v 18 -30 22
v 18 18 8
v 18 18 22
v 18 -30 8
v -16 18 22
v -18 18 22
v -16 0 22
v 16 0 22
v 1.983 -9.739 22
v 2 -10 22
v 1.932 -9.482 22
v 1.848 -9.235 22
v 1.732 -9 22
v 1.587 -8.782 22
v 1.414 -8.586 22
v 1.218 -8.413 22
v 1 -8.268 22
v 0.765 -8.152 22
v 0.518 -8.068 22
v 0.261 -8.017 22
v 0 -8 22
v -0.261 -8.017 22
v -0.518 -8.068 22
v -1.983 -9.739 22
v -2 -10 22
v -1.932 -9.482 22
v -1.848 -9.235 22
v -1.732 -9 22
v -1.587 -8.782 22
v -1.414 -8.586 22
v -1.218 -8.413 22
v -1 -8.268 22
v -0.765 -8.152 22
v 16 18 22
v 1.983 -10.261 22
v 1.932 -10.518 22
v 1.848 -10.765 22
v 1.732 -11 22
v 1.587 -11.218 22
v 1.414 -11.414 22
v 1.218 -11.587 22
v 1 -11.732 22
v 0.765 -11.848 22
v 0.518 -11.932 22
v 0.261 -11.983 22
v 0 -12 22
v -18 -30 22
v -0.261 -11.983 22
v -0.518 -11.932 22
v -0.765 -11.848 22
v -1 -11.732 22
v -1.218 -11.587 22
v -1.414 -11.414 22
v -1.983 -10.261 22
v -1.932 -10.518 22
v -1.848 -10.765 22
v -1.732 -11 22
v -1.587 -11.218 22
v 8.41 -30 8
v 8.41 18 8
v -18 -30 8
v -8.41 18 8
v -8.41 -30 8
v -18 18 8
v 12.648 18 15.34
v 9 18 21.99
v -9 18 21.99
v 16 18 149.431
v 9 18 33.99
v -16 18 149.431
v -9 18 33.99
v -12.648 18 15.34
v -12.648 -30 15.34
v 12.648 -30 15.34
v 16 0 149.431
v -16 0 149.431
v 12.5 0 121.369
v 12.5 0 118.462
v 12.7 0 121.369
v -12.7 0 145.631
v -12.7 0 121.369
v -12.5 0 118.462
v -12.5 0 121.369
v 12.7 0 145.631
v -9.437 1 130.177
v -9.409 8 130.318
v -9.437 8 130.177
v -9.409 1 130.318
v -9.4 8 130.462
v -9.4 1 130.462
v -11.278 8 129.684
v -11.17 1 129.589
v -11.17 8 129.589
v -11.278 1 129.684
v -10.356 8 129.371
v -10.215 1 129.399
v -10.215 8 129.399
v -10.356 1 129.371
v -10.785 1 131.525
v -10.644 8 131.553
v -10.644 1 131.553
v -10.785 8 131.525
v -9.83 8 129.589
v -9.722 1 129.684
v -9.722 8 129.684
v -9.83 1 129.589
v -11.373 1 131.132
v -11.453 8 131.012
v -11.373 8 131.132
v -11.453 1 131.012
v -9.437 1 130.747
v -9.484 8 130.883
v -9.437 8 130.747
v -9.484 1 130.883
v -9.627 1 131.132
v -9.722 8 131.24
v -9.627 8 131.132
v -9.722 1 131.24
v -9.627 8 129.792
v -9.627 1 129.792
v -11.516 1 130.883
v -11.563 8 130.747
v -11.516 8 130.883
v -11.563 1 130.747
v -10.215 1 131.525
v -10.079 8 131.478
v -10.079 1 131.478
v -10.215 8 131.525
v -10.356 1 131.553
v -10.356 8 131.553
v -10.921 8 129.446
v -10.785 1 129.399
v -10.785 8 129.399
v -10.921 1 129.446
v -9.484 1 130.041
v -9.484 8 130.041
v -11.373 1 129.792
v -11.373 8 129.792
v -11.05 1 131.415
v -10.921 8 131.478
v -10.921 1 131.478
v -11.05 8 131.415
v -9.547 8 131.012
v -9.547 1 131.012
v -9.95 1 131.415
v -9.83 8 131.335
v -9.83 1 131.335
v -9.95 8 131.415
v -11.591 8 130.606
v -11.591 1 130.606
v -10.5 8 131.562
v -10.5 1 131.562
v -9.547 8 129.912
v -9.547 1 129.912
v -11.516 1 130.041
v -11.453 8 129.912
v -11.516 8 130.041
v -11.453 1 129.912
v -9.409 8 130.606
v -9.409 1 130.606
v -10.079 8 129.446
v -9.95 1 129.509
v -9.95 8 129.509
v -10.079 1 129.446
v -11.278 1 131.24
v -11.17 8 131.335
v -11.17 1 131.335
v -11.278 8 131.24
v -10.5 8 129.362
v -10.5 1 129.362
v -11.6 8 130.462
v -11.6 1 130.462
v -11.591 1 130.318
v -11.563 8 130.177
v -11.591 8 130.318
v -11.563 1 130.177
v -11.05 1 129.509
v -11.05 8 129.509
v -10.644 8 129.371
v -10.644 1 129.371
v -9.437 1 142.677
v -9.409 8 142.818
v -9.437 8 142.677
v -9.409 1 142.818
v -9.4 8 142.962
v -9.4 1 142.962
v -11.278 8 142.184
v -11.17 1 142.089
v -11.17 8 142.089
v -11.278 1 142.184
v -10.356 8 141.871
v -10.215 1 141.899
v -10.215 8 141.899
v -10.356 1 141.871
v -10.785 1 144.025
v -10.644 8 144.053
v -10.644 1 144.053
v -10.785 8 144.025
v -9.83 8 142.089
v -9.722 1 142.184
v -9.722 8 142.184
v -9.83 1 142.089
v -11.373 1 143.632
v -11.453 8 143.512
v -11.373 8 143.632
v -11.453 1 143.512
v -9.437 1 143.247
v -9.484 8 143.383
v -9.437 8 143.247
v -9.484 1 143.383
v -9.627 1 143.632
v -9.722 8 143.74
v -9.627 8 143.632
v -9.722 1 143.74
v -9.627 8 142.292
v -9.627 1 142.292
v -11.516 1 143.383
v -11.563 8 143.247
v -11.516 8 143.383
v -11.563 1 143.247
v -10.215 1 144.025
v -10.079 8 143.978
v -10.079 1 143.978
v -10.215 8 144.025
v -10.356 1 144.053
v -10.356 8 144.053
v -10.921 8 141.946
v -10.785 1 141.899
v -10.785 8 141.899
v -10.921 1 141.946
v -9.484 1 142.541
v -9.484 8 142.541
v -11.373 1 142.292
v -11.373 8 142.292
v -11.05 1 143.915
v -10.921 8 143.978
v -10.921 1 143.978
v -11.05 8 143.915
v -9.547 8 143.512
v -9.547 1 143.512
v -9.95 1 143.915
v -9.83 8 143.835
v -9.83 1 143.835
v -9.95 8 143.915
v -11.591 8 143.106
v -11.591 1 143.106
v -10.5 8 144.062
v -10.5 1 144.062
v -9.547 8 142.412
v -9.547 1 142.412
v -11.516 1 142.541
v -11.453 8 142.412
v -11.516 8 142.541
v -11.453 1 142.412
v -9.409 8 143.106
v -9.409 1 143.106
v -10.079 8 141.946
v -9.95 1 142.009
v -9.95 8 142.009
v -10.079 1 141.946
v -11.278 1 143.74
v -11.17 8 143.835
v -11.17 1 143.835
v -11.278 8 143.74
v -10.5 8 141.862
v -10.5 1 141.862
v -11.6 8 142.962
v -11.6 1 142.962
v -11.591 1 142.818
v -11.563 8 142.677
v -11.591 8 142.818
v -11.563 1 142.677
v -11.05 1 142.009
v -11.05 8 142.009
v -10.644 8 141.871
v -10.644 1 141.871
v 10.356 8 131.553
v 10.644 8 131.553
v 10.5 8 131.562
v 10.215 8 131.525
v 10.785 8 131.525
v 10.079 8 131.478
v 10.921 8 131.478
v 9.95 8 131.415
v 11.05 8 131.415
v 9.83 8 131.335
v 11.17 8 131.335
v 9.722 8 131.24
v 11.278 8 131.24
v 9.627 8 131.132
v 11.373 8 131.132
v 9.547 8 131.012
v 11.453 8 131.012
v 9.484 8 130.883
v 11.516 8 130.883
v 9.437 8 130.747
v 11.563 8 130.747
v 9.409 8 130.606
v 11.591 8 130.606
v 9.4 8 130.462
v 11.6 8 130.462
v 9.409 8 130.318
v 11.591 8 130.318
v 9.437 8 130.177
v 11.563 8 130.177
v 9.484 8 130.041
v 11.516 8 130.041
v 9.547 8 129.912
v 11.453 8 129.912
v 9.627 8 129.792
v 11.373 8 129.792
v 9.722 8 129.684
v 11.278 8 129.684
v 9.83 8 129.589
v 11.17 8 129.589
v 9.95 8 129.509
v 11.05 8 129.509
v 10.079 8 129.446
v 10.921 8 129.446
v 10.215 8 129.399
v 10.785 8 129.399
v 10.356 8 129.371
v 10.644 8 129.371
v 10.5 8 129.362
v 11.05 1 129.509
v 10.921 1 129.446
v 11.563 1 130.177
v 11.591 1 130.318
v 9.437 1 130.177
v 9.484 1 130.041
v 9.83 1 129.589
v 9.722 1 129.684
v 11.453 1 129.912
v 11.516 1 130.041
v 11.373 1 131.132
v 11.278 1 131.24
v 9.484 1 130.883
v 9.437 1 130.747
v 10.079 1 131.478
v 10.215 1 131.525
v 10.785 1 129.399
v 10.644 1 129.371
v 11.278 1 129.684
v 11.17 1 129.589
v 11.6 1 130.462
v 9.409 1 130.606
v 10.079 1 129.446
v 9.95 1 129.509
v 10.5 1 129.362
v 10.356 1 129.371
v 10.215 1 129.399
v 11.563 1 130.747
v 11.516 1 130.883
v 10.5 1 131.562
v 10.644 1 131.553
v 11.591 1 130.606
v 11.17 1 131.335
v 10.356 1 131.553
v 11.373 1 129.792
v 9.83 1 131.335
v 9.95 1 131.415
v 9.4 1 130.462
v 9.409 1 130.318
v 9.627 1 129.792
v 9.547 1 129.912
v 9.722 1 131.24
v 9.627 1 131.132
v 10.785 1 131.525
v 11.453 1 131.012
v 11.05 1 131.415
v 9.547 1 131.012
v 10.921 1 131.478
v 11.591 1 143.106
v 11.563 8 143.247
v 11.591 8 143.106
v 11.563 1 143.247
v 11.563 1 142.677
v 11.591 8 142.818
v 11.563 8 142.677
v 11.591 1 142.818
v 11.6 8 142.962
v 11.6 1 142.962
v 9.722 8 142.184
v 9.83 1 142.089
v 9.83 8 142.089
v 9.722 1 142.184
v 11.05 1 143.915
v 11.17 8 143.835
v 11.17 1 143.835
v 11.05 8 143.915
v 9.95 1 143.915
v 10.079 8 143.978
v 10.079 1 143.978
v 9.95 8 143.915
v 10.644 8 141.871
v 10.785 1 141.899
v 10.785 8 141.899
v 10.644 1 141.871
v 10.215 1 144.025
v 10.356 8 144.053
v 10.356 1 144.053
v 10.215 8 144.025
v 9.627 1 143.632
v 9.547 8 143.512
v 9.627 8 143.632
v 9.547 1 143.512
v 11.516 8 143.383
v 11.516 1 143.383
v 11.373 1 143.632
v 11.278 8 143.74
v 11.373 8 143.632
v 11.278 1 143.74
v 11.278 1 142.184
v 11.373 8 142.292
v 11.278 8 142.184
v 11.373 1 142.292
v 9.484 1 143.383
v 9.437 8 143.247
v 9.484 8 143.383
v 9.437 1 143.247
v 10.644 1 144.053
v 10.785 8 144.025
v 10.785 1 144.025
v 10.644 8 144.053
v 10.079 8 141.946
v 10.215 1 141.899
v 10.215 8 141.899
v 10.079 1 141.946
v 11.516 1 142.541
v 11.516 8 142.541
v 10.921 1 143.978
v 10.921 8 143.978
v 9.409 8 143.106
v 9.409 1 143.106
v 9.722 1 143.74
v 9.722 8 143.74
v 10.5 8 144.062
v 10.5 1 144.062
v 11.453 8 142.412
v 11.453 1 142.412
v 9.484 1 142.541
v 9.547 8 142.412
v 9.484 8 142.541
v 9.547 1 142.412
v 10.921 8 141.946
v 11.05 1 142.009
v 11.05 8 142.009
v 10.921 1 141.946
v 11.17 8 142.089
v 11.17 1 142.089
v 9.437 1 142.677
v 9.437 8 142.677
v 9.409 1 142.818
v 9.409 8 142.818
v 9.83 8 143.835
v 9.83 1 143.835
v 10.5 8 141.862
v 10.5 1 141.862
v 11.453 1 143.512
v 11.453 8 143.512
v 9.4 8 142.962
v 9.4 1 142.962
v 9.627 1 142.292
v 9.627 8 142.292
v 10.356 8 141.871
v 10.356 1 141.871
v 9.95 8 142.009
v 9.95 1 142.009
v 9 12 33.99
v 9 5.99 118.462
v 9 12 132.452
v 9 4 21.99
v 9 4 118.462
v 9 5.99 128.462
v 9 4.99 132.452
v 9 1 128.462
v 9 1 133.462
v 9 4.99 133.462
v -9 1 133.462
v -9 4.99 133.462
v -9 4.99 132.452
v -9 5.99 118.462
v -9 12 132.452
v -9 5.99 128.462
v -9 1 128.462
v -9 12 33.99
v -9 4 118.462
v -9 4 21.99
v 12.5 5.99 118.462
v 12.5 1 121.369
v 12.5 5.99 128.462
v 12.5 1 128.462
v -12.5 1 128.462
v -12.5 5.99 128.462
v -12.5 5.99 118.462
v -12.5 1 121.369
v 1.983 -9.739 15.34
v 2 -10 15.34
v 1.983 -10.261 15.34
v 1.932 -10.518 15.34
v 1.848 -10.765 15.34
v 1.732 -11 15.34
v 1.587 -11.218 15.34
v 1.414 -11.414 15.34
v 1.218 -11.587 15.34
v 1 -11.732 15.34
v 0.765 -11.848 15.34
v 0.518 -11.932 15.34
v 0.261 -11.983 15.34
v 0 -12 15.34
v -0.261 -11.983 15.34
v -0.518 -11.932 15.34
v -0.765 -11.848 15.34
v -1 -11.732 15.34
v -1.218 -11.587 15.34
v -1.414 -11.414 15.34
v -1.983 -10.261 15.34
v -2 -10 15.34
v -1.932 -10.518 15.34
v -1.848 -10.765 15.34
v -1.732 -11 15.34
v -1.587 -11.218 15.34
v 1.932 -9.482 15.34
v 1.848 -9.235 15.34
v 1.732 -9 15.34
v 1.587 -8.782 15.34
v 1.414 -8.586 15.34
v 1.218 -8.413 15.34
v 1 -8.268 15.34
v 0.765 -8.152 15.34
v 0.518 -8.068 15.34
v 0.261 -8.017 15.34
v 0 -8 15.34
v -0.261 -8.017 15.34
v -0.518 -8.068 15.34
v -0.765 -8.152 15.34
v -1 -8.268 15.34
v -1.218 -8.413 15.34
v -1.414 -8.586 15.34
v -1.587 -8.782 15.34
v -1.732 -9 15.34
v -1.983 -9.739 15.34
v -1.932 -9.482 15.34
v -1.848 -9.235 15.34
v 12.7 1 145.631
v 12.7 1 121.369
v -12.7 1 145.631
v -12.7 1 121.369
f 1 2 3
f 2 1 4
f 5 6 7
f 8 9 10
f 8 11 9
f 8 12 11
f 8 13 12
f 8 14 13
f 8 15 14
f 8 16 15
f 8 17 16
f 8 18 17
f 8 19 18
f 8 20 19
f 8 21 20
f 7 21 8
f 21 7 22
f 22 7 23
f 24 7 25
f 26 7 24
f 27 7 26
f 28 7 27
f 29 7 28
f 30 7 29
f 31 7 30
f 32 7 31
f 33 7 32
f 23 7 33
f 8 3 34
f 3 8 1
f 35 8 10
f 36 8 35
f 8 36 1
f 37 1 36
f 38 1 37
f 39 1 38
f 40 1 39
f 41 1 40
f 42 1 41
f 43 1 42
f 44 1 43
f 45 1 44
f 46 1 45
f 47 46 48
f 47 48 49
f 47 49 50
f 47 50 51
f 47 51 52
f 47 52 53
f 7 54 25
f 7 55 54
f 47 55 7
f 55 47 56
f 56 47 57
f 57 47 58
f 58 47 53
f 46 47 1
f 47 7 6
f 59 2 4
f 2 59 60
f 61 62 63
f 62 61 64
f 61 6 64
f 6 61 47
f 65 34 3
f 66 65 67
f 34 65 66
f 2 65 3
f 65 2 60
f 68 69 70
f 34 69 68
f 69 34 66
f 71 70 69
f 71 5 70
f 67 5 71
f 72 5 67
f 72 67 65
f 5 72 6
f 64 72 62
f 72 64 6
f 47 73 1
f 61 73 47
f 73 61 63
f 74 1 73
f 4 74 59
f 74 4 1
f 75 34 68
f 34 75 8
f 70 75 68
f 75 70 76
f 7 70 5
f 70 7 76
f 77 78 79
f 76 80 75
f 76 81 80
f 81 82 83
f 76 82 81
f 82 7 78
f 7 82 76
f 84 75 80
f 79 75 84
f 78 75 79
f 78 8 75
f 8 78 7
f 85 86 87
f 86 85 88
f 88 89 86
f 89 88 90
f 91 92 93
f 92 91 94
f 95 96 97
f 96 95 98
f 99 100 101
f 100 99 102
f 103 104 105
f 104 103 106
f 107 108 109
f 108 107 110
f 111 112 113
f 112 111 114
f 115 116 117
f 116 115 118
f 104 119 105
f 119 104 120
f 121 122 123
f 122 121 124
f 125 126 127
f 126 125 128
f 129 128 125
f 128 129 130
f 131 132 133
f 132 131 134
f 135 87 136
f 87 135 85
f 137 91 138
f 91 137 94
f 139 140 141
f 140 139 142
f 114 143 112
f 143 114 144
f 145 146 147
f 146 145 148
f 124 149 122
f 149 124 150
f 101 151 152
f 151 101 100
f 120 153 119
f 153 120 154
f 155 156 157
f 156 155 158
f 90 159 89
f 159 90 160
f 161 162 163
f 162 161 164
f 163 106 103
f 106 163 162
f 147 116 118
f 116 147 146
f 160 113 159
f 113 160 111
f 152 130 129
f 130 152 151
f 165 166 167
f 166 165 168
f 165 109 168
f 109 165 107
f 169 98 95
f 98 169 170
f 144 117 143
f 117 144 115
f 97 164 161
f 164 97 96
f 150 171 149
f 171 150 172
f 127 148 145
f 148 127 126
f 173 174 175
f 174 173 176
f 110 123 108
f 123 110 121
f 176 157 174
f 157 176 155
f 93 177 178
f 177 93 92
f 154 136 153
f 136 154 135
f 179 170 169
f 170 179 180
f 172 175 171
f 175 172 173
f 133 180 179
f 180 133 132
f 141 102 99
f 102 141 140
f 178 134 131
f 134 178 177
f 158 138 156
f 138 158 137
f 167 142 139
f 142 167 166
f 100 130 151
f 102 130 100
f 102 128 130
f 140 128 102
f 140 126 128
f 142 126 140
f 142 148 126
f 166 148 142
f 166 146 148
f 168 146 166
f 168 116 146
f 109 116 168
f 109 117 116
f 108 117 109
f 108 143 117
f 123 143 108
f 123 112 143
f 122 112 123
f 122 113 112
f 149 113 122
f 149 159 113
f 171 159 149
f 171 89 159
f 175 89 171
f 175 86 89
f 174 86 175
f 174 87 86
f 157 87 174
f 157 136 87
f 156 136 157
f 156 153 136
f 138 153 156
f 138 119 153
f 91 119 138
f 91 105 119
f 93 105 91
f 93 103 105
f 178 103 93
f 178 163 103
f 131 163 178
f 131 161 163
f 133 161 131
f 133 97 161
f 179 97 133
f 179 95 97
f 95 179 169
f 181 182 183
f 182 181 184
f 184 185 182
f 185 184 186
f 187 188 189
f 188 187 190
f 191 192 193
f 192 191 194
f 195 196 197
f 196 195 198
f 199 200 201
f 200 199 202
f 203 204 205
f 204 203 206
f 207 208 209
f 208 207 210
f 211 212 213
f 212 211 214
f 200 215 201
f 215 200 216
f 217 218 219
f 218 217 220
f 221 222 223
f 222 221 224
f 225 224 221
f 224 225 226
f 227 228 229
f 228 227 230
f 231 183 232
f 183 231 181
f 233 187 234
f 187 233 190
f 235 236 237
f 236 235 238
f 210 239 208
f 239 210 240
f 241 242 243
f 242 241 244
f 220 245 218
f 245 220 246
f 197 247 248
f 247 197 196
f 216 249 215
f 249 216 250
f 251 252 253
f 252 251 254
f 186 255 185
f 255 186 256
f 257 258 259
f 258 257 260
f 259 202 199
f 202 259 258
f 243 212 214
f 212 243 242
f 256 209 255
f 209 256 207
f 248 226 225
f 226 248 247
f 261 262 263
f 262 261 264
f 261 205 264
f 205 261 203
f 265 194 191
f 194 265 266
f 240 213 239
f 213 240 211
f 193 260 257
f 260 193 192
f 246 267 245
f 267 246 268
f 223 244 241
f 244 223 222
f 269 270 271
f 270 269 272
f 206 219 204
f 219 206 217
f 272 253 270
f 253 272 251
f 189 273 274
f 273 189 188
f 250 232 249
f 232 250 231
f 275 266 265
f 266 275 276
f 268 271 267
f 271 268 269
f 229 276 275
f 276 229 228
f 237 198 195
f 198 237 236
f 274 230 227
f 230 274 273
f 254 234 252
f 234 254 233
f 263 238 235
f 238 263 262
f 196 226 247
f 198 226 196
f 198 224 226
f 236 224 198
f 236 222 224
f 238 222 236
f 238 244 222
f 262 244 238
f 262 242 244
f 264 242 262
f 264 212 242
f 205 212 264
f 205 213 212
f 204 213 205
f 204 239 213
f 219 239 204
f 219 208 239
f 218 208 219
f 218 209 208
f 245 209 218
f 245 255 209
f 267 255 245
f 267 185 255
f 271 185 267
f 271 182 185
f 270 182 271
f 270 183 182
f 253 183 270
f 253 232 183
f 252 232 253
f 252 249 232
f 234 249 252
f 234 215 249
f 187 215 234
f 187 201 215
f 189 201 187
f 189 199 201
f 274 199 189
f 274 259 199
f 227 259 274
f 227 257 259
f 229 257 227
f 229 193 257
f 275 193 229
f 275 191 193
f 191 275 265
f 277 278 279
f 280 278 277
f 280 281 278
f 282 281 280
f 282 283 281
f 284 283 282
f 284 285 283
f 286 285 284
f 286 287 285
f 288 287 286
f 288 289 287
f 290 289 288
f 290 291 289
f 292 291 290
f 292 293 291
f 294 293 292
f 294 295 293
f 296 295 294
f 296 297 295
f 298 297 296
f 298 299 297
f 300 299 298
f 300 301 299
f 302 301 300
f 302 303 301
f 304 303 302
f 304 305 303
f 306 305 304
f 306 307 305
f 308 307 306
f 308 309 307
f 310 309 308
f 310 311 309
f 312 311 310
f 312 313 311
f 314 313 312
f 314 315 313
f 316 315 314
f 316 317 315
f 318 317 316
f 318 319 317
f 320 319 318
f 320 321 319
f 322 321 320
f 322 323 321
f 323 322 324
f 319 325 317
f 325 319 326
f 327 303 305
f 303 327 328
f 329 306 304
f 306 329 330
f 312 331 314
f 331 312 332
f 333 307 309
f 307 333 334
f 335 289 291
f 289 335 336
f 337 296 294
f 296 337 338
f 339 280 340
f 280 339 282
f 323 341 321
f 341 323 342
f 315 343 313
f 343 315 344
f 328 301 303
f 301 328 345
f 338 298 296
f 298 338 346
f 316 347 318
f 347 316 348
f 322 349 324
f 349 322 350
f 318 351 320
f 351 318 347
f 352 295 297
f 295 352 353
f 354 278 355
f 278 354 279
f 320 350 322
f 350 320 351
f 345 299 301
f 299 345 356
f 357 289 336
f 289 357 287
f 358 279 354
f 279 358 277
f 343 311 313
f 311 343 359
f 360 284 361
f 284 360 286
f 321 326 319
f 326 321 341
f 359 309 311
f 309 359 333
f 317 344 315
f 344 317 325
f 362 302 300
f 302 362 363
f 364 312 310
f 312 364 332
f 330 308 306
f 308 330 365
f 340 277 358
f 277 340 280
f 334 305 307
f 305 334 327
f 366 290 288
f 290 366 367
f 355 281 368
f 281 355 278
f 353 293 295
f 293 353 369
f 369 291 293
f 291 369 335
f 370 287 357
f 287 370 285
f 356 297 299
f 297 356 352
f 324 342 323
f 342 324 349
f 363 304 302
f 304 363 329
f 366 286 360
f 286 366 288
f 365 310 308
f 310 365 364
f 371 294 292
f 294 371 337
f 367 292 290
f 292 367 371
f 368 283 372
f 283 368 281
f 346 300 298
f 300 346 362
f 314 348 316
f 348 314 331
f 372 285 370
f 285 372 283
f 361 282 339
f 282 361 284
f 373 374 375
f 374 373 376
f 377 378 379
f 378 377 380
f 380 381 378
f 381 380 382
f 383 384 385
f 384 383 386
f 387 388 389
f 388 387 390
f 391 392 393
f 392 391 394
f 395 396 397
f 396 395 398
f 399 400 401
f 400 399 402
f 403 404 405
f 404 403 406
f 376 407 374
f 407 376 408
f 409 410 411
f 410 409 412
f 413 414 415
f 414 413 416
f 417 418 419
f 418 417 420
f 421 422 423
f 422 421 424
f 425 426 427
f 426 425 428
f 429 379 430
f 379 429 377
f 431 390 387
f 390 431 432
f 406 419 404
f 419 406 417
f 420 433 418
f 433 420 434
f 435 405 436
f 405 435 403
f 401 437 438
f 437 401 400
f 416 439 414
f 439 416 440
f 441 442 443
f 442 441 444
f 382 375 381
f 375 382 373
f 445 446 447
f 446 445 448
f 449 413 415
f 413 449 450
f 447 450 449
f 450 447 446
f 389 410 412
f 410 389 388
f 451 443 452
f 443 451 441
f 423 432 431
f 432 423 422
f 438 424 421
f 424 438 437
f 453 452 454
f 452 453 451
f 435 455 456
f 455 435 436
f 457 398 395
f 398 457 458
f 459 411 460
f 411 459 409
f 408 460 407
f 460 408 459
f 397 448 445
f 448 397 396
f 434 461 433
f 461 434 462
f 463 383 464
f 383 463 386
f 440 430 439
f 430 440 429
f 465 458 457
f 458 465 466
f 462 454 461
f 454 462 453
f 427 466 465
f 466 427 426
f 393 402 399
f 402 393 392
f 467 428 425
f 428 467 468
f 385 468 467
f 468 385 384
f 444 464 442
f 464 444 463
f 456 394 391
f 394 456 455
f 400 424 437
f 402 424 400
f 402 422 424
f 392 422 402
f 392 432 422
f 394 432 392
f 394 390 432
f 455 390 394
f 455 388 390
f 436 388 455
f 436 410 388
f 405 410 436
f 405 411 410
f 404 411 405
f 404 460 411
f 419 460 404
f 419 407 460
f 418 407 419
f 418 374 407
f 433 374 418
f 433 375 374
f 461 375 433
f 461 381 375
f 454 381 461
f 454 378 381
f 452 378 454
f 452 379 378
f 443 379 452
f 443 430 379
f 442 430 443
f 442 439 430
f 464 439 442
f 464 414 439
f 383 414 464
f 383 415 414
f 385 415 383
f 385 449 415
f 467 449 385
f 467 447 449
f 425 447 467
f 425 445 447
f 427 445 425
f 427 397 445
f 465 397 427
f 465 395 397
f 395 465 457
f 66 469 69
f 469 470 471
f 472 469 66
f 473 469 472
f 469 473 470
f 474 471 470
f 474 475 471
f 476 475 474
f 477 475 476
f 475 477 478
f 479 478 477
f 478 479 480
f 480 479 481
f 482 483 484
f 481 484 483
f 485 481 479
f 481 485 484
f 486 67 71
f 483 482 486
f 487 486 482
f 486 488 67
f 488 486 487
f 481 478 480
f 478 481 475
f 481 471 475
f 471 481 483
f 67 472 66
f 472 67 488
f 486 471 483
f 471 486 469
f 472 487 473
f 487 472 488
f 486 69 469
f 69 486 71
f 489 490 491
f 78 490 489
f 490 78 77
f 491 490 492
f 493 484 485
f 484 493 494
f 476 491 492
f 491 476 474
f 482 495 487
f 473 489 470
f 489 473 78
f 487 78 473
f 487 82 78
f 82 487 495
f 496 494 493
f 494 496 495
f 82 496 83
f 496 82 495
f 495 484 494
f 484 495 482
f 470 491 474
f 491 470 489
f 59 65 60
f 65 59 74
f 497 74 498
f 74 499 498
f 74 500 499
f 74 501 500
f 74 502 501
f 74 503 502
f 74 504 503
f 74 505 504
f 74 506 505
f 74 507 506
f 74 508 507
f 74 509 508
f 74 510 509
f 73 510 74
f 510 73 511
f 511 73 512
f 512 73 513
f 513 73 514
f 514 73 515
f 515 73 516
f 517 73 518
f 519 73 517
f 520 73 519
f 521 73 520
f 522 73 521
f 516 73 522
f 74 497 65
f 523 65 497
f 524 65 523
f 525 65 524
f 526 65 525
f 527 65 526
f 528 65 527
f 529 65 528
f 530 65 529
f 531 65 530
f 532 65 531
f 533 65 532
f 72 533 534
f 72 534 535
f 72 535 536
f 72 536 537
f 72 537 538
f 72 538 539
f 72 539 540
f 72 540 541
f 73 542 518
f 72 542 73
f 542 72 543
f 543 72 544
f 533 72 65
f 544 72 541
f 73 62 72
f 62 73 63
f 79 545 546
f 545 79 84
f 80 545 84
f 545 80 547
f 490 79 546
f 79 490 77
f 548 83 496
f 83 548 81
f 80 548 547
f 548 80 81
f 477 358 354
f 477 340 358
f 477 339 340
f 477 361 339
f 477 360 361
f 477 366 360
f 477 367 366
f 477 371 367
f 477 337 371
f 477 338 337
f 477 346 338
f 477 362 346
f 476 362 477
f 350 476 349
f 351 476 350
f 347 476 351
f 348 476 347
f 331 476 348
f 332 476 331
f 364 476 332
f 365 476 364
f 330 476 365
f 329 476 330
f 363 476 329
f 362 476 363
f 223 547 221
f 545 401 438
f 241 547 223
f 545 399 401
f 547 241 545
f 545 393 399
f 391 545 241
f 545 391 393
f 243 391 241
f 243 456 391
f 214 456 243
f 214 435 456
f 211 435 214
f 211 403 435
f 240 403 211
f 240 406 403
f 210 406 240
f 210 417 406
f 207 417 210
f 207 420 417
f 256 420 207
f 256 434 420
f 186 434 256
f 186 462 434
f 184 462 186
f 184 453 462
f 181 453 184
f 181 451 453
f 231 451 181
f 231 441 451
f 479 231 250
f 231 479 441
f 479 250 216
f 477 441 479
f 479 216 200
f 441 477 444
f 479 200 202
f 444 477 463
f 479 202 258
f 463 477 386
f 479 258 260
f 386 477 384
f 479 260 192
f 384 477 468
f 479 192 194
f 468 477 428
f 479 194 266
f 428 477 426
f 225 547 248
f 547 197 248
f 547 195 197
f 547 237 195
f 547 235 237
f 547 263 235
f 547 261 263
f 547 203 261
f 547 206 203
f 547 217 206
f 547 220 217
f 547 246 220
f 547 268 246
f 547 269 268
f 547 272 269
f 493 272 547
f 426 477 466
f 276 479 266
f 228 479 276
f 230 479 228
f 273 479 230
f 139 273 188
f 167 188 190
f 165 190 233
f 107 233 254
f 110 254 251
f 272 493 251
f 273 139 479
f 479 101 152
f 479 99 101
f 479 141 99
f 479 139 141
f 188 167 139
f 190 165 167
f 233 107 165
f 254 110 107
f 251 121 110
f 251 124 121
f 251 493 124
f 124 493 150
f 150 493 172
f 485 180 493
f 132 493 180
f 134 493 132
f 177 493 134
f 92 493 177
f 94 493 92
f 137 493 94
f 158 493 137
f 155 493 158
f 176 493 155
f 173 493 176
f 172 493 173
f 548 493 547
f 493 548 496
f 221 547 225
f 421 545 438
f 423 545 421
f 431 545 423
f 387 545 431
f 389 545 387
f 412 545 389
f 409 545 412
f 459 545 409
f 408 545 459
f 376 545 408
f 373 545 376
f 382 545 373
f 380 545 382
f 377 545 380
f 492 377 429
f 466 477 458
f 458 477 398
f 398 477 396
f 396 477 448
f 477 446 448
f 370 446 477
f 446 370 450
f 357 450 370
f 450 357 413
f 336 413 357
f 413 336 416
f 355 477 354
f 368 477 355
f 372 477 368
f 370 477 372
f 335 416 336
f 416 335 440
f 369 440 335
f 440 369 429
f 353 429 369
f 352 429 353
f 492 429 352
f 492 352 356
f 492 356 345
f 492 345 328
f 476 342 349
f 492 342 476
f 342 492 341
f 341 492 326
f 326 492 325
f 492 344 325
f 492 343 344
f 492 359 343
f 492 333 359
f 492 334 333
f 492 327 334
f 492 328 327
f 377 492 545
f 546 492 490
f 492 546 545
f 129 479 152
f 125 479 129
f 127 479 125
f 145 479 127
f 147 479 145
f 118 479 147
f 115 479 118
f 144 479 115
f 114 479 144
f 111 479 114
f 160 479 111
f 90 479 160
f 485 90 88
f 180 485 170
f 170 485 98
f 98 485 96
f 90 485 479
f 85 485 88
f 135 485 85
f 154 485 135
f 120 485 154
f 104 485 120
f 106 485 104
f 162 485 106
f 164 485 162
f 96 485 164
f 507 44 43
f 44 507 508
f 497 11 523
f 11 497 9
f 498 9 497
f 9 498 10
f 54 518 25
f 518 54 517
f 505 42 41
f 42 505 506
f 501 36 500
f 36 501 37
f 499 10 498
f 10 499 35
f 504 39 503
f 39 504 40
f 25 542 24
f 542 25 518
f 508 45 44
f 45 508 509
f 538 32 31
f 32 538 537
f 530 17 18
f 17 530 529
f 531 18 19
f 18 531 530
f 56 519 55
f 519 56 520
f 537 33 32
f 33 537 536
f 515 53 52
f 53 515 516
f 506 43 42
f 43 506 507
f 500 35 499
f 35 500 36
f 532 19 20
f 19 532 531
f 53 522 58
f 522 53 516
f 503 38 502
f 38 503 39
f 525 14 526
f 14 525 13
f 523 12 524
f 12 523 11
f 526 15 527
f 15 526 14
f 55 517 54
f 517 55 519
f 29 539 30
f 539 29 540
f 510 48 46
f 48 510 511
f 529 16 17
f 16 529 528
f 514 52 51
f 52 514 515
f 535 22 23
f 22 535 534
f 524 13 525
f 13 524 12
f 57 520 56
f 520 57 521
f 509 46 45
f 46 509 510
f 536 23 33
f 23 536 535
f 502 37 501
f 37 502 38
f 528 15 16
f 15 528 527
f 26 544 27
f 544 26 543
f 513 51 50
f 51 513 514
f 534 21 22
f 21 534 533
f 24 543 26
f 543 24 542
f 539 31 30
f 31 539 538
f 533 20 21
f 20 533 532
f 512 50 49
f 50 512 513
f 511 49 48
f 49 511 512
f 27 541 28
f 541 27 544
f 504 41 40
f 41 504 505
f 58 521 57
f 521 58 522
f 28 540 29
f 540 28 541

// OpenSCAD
// Camera carriage, slides on the rail.
include <camera_mount.scad>

carriage(0);
